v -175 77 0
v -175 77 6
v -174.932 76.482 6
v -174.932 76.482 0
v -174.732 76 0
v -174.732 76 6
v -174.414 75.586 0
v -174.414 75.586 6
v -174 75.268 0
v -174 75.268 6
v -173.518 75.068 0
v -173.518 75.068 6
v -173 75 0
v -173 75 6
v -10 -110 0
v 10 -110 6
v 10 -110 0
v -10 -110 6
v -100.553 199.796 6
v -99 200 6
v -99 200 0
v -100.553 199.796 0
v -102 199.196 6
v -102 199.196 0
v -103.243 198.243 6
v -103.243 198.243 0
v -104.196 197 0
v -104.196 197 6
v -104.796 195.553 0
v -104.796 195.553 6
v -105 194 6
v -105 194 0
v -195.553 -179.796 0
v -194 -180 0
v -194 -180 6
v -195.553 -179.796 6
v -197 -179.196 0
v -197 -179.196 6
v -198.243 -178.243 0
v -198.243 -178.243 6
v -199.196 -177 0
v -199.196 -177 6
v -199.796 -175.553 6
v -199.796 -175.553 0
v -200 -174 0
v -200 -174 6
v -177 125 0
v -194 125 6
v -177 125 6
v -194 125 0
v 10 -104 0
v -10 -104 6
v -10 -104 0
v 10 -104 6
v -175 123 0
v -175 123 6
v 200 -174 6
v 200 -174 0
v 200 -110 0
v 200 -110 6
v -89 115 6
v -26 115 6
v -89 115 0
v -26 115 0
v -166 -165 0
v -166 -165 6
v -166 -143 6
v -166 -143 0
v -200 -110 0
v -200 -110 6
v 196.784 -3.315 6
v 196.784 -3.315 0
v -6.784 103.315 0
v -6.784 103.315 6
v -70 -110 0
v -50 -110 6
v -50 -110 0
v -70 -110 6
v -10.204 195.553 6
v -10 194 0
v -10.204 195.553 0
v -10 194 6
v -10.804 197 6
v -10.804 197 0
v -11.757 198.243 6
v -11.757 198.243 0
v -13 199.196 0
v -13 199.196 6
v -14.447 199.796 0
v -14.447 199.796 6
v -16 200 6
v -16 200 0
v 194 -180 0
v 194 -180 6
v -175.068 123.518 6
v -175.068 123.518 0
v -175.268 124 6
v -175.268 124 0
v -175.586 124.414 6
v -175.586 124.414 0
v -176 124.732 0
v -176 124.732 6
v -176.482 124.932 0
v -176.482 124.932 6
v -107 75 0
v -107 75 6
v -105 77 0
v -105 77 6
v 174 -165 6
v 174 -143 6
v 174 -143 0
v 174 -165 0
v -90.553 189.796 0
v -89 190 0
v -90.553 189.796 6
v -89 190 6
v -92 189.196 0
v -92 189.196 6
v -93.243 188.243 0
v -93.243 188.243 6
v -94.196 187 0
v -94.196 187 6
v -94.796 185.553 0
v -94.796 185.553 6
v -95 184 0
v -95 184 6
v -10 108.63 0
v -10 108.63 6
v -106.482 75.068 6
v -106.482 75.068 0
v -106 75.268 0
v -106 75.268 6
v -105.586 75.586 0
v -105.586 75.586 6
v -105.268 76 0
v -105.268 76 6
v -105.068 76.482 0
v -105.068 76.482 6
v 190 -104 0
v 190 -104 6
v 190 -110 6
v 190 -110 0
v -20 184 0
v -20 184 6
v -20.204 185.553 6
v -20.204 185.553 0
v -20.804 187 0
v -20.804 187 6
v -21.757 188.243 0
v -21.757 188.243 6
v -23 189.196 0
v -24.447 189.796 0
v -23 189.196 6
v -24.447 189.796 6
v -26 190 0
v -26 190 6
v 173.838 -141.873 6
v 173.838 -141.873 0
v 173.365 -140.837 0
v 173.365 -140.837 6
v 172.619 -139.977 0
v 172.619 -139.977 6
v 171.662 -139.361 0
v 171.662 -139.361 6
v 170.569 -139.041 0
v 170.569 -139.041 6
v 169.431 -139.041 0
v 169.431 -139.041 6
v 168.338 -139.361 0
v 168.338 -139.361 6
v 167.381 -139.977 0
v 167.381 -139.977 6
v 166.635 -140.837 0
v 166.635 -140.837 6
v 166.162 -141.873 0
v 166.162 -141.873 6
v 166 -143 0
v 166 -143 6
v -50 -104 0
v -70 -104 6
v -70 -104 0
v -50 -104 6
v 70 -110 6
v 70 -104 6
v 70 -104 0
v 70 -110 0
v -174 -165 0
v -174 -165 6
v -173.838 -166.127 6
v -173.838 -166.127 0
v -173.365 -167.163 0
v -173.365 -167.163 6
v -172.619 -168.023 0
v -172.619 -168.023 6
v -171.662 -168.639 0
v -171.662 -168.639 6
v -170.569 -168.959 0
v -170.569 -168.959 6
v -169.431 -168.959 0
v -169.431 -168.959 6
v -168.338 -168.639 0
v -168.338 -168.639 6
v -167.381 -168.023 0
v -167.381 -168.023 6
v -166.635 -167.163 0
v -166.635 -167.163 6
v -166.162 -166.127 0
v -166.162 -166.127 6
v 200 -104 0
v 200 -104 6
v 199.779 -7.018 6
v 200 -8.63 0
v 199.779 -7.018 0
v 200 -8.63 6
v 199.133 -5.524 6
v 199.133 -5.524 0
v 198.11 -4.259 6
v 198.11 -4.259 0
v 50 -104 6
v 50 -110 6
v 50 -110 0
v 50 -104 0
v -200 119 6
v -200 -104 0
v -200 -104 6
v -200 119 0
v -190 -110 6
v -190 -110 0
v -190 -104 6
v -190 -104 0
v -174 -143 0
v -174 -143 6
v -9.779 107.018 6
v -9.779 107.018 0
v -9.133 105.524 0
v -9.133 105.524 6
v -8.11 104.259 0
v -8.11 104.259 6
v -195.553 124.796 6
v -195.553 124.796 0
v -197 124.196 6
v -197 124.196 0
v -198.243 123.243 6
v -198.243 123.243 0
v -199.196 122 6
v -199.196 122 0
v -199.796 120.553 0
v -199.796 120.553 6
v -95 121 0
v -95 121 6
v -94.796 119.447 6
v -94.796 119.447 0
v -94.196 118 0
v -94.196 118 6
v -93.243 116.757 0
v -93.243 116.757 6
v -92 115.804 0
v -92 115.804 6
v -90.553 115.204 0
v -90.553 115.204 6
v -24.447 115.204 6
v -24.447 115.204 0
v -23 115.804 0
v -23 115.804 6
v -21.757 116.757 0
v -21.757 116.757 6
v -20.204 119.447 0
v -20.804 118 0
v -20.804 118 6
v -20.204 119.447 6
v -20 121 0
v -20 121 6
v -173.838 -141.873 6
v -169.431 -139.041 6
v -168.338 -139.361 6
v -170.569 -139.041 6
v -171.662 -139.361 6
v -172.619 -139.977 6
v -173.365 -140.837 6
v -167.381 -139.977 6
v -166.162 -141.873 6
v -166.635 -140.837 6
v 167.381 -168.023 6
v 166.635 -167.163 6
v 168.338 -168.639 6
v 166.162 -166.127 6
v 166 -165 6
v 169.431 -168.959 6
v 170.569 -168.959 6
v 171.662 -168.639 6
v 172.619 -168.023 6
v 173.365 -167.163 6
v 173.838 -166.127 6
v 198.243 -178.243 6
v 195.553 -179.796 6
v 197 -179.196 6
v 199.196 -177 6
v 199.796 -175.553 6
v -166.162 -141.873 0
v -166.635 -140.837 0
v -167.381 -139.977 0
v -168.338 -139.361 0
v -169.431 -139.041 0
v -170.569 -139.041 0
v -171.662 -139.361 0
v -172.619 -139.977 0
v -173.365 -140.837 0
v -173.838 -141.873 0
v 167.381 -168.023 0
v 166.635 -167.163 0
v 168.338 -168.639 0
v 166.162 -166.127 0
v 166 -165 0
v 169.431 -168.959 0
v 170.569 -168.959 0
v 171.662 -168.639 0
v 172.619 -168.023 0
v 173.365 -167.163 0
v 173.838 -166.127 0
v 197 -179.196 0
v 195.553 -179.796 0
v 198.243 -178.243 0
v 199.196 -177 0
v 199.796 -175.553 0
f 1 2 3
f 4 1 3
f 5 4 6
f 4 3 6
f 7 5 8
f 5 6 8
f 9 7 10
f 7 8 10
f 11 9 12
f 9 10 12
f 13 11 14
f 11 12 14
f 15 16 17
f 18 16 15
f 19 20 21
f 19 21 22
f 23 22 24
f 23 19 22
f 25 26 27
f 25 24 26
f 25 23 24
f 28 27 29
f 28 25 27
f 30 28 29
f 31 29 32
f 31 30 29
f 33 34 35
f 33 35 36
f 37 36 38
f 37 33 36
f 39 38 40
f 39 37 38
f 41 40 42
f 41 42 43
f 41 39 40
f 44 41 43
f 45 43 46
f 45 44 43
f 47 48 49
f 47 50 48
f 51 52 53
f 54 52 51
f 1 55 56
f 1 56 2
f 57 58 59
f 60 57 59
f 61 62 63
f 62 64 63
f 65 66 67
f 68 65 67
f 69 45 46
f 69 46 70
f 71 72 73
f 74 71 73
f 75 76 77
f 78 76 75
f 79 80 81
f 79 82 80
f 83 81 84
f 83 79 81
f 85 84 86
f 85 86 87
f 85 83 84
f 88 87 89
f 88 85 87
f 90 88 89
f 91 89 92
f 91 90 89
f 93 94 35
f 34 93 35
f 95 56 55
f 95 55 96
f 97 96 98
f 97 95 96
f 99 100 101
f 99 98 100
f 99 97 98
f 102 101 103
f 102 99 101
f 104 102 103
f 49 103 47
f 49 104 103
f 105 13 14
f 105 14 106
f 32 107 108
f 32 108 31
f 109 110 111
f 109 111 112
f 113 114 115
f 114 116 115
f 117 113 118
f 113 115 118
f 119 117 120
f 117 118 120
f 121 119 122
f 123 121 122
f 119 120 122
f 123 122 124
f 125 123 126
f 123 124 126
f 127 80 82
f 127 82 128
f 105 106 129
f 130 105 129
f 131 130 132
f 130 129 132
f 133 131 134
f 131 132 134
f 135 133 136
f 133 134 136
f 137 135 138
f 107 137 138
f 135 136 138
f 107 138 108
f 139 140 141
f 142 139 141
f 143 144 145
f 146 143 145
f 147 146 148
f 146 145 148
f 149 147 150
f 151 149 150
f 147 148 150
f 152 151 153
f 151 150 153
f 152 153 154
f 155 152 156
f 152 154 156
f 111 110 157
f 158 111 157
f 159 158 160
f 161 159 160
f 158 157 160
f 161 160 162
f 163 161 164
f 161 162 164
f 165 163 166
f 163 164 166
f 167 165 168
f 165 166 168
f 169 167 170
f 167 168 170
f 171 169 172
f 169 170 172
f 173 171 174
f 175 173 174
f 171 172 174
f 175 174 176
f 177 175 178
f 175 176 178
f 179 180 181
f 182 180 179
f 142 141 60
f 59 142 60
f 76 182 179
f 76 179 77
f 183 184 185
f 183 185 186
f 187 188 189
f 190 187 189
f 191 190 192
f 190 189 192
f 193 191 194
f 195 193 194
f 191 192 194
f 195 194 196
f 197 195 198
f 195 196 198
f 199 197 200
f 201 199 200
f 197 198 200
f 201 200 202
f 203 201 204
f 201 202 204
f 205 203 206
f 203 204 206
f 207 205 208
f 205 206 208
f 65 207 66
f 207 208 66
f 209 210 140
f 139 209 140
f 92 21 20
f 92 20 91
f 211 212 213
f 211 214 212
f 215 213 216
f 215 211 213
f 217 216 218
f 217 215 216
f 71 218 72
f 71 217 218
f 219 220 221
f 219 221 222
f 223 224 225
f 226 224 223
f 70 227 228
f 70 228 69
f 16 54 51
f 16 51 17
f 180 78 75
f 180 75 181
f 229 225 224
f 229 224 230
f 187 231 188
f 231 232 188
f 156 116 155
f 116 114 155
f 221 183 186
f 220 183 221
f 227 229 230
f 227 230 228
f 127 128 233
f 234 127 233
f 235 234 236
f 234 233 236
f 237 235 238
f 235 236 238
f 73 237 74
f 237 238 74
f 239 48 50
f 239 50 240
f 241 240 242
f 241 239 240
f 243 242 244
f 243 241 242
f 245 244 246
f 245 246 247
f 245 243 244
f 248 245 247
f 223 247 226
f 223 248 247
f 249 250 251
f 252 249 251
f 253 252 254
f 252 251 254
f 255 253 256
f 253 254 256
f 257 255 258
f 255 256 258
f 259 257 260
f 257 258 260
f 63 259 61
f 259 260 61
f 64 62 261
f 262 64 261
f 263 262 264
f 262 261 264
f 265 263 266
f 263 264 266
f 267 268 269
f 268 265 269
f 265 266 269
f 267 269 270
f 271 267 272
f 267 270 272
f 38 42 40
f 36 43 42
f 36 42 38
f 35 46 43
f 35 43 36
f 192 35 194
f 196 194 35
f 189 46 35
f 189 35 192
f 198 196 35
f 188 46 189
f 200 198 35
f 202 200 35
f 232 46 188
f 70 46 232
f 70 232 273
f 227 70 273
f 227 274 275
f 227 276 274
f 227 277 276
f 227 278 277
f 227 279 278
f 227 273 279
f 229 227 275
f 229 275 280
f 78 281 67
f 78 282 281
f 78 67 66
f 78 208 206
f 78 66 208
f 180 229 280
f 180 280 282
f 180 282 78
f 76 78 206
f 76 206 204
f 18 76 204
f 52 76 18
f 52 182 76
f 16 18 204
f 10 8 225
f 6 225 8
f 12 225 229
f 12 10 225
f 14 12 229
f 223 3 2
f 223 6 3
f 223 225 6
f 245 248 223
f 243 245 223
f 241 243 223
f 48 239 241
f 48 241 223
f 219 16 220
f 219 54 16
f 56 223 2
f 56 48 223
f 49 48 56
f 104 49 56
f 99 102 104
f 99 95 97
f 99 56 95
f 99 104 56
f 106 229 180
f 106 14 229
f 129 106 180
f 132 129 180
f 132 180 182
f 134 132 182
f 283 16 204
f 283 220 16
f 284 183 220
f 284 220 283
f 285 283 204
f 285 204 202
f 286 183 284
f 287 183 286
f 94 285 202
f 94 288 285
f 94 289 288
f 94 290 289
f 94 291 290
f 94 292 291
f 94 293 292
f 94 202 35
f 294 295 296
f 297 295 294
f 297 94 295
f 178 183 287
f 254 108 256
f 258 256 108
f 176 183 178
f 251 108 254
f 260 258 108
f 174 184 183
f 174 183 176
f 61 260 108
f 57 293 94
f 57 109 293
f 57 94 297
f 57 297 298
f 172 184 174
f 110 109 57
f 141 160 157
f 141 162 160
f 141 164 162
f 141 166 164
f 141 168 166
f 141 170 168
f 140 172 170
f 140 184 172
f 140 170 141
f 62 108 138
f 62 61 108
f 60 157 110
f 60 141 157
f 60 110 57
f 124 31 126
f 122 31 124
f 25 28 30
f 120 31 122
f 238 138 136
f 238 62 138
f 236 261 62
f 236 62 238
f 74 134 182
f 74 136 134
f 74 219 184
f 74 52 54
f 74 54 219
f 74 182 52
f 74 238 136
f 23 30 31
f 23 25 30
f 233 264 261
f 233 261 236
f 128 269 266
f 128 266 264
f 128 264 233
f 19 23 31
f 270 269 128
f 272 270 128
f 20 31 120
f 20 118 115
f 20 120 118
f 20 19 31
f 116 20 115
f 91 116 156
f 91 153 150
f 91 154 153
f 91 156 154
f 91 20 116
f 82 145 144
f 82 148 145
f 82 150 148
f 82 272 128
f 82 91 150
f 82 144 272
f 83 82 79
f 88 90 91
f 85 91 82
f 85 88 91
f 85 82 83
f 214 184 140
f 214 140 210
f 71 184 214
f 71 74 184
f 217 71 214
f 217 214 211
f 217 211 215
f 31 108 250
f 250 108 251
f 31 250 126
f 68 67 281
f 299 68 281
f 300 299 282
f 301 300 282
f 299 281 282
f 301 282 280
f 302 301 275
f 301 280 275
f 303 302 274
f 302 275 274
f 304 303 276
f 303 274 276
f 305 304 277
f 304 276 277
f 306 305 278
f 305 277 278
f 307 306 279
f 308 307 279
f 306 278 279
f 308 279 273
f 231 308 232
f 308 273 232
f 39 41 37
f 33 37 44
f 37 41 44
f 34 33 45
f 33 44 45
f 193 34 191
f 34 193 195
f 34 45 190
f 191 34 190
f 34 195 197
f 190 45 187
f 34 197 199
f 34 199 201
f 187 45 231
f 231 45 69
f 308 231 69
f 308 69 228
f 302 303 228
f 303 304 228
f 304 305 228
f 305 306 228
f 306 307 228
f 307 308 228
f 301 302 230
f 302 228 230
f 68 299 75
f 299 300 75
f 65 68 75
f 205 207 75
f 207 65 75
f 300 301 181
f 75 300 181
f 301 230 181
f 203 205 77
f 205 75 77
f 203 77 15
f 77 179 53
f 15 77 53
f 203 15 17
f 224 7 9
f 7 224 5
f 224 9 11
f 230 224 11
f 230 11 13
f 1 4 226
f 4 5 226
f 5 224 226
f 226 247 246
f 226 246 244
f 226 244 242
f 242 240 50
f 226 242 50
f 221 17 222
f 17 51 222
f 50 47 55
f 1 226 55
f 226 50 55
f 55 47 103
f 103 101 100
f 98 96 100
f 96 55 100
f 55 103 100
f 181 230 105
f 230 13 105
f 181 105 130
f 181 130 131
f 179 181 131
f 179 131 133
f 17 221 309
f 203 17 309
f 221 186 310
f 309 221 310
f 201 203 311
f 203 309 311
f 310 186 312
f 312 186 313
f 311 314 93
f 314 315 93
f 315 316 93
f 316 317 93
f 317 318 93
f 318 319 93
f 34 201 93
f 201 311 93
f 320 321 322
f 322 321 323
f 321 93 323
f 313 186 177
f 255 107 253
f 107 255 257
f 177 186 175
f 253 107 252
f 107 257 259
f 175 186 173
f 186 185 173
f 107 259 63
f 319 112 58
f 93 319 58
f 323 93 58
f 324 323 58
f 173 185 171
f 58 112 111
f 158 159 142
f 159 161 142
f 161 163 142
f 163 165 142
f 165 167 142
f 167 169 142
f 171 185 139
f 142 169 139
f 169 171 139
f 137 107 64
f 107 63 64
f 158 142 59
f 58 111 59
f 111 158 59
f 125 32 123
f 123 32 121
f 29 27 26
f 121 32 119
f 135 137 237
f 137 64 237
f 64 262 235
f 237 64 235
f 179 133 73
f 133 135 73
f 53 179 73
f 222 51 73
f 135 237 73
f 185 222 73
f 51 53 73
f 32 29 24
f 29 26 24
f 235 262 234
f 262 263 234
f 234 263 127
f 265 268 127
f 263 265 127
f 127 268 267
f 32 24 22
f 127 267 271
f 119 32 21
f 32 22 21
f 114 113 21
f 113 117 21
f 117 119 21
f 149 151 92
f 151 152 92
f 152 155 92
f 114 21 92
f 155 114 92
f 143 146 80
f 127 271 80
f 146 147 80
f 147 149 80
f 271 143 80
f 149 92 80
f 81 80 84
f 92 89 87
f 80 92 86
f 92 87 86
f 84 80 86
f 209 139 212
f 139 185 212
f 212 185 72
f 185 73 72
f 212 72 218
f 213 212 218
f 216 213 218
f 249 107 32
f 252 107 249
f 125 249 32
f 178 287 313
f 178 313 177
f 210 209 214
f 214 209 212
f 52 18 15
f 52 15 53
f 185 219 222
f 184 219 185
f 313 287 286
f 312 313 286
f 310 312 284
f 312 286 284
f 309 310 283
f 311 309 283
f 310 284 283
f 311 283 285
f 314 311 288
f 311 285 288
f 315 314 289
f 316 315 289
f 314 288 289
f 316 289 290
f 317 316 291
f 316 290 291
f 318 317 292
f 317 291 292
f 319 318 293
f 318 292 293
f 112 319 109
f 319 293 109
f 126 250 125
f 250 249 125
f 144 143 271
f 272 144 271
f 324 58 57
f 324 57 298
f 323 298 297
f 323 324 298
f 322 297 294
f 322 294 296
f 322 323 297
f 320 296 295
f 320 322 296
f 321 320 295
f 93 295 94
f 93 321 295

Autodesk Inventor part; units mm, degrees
ref_plane "YZ Plane" through (0, 0, 0) normal (1, 0, 0) x (0, 1, 0)
ref_plane "XZ Plane" through (0, 0, 0) normal (0, 1, 0) x (-1, 0, 0)
ref_plane "XY Plane" through (0, 0, 0) normal (0, 0, 1) x (1, 0, 0)
sketch "Boceto1" plane through (0, 0, 0) normal (0, 0, 1) x (1, 0, 0)
  line L0 (200, -200) -> (-200, -200)
  line L1 (-200, -200) -> (-200, 105)
  line L2 (-105, 105) -> (-105, 200)
  line L3 (-105, 200) -> (-10, 200)
  line L4 (-10, 200) -> (-10, 105)
  line L5 (200, -200) -> (200, -5)
  line L6 (200, -5) -> (-10, 105)
  line L7 (-20, 115) -> (-95, 115)
  line L8 (-95, 115) -> (-95, 190)
  line L9 (-95, 190) -> (-20, 190)
  line L10 (-20, 190) -> (-20, 115)
  line L11 (-20, 115) -> (-95, 190) construction
  line L12 (-95, 115) -> (-20, 190) construction
  line L13 (-200, 105) -> (-200, 125)
  line L14 (-200, 125) -> (-175, 125)
  line L15 (-175, 125) -> (-175, 75)
  line L16 (-175, 75) -> (-105, 75)
  line L17 (-105, 75) -> (-105, 105)
  point P0 (0, 0)
  point P1 (-57.5, 152.5)
  dimension "d0" = 305
  dimension "d1" = 95
  dimension "d2" = 95
  dimension "d3" = 195
  dimension "d4" = 400
  dimension "d7" = 75
  dimension "d8" = 75
  dimension "d9" = 20
  dimension "d10" = 25
  dimension "d11" = 50
extrude "Extrusión1" add sketch "Boceto1" along normal blind 6
fillet "Empalme1" radius 2 3 edges at (-175, 125, 3) (-175, 75, 3) (-105, 75, 3)
fillet "Empalme2" radius 6 11 edges at (-200, 125, 3) (-105, 200, 3) (-10, 200, 3) (-10, 105, 3) (-95, 115, 3) (-95, 190, 3) (-20, 190, 3) (-20, 115, 3) (200, -5, 3) (200, -200, 3) (-200, -200, 3)
sketch "Boceto2" plane through (0, 0, 6) normal (0, 0, 1) x (1, 0, 0)
  line L0 (10, -110) -> (-10, -110)
  line L1 (-10, -110) -> (-10, -104)
  line L2 (-10, -104) -> (10, -104)
  line L3 (10, -104) -> (10, -110)
  line L4 (10, -110) -> (-10, -104) construction
  line L5 (-10, -110) -> (10, -104) construction
  line L6 (-50, -110) -> (-70, -110)
  line L7 (-70, -110) -> (-70, -104)
  line L8 (-70, -104) -> (-50, -104)
  line L9 (-50, -104) -> (-50, -110)
  line L10 (-50, -110) -> (-70, -104) construction
  line L11 (-70, -110) -> (-50, -104) construction
  line L12 (70, -110) -> (50, -110)
  line L13 (50, -110) -> (50, -104)
  line L14 (50, -104) -> (70, -104)
  line L15 (70, -104) -> (70, -110)
  line L16 (70, -110) -> (50, -104) construction
  line L17 (50, -110) -> (70, -104) construction
  circle A0 centre (-170, -107) radius 4
  line L18 (-190, -110) -> (-210, -110)
  line L19 (-210, -110) -> (-210, -104)
  line L20 (-210, -104) -> (-190, -104)
  line L21 (-190, -104) -> (-190, -110)
  line L22 (-200, -149) -> (-200, 99)
  line L23 (-190, -110) -> (-210, -104) construction
  line L24 (-210, -110) -> (-190, -104) construction
  line L25 (0, 0) -> (0, -107)
  line L26 (210, -104) -> (190, -104)
  line L27 (190, -110) -> (210, -110)
  line L28 (190, -104) -> (190, -110)
  line L29 (210, -110) -> (210, -104)
  point P0 (-60, -107)
  point P1 (60, -107)
  point P2 (-200, -107)
  dimension "d16" = 20
  dimension "d17" = 6
  dimension "d18" = 20
  dimension "d19" = 60
  dimension "d20" = 20
  dimension "d21" = 60
  dimension "d22" = 8
  dimension "d23" = 20
  dimension "d24" = 6
  dimension "d25" = 110
  dimension "d27" = 6
  dimension "d28" = 6
  dimension "d29" = 107
extrude "Extrusión2" cut sketch "Boceto2" against normal through all contours L0 L1 L2 L3 | L6 L7 L8 L9 | L12 L13 L14 L15 | L18 L22 L20 L21 | L18 L19 L20 L22 | L29 L27 L28 L26
sketch "Boceto3" plane through (0, 0, 6) normal (0, 0, 1) x (1, 0, 0)
  line L0 (-194, -200) -> (194, -200) projected
  line L1 (0, -200) -> (0, -130)
  line L2 (0, -130) -> (-200, -130)
  line L3 (-200, -110) -> (-200, -194) projected
  line L4 (-200, -130) -> (-200, -120)
  line L5 (-200, -120) -> (200, -120)
  line L6 (200, -110) -> (200, -194) projected
  line L7 (0, -130) -> (200, -130)
  line L8 (200, -120) -> (200, -130)
  line L9 (10, -110) -> (-10, -110)
  line L10 (-10, -110) -> (-10, -104)
  line L11 (-10, -104) -> (10, -104)
  line L12 (10, -104) -> (10, -110)
  line L13 (10, -110) -> (-10, -104) construction
  line L14 (-10, -110) -> (10, -104) construction
  line L15 (-50, -110) -> (-70, -110)
  line L16 (-70, -110) -> (-70, -104)
  line L17 (-70, -104) -> (-50, -104)
  line L18 (-50, -104) -> (-50, -110)
  line L19 (-50, -110) -> (-70, -104) construction
  line L20 (-70, -110) -> (-50, -104) construction
  line L21 (70, -110) -> (50, -110)
  line L22 (50, -110) -> (50, -104)
  line L23 (50, -104) -> (70, -104)
  line L24 (70, -104) -> (70, -110)
  line L25 (70, -110) -> (50, -104) construction
  line L26 (50, -110) -> (70, -104) construction
  circle A0 centre (-170, -107) radius 4
  line L27 (-190, -110) -> (-210, -110)
  line L28 (-210, -110) -> (-210, -104)
  line L29 (-210, -104) -> (-190, -104)
  line L30 (-190, -104) -> (-190, -110)
  line L31 (-200, -149) -> (-200, 99)
  line L32 (-190, -110) -> (-210, -104) construction
  line L33 (-210, -110) -> (-190, -104) construction
  circle A1 centre (-80, -95) radius 3
  circle A2 centre (-80, -51) radius 3
  circle A3 centre (-170, -80) radius 3
  circle A4 centre (-170, -60) radius 3
  line L34 (0, 0) -> (0, -107)
  circle A5 centre (170, -107) radius 4
  line L35 (210, -104) -> (190, -104)
  line L36 (190, -110) -> (210, -110)
  line L37 (190, -104) -> (190, -110)
  line L38 (210, -110) -> (210, -104)
  circle A6 centre (80, -95) radius 3
  circle A7 centre (80, -51) radius 3
  circle A8 centre (170, -107) radius 13
  circle A9 centre (-170, -107) radius 13
  circle A10 centre (-170, -143) radius 13
  circle A11 centre (-170, -143) radius 4
  circle A12 centre (-170, -165) radius 4
  line L39 (-174, -143) -> (-174, -165)
  line L40 (-166, -165) -> (-166, -143)
  circle A13 centre (170, -143) radius 13
  circle A14 centre (170, -143) radius 4
  circle A15 centre (170, -165) radius 4
  line L41 (174, -143) -> (174, -165)
  line L42 (166, -165) -> (166, -143)
  point P0 (-60, -107)
  point P1 (60, -107)
  point P2 (-200, -107)
  dimension "d33" = 70
  dimension "d34" = 10
  dimension "d35" = 20
  dimension "d36" = 6
  dimension "d38" = 20
  dimension "d39" = 60
  dimension "d40" = 20
  dimension "d41" = 60
  dimension "d42" = 8
  dimension "d43" = 20
  dimension "d44" = 6
  dimension "d45" = 110
  dimension "d46" = 6
  dimension "d47" = 20
  dimension "d48" = 12
  dimension "d49" = 6
  dimension "d50" = 44
  dimension "d51" = 6
  dimension "d52" = 6
  dimension "d54" = 6
  dimension "d55" = 6
  dimension "d56" = 26
  dimension "d57" = 8
  dimension "d58" = 8
extrude "Extrusión3" cut sketch "Boceto3" against normal through all contours L39 A11 L40 A10 | A10 L40 A12 L39 | L42 A14 L41 A13 | A13 L41 A15 L42 | A11 | A12 | A15 | A14 picked at (-169.8393, -152.9432) picked at (170.1607, -152.9432)
sketch "Boceto5" plane through (0, 0, 6) normal (0, 0, 1) x (1, 0, 0)
  line L0 (-194, -200) -> (194, -200) projected
  line L1 (0, -200) -> (200, -200)
  line L2 (200, -200) -> (200, -180)
  line L3 (200, -194) -> (200, -110) projected
  line L4 (200, -180) -> (-200, -180)
  line L5 (-200, -110) -> (-200, -194) projected
  line L6 (-200, -200) -> (-200, -180)
  line L7 (-200, -200) -> (0, -200)
  point P0 (0, 0)
  dimension "d61" = 20
extrude "Extrusión4" cut sketch "Boceto5" against normal through all
fillet "Empalme3" radius 6 2 edges at (-200, -180, 3) (200, -180, 3)
properties part number "INTERNAL SIDE PLATE" material "Acero, carbono"
